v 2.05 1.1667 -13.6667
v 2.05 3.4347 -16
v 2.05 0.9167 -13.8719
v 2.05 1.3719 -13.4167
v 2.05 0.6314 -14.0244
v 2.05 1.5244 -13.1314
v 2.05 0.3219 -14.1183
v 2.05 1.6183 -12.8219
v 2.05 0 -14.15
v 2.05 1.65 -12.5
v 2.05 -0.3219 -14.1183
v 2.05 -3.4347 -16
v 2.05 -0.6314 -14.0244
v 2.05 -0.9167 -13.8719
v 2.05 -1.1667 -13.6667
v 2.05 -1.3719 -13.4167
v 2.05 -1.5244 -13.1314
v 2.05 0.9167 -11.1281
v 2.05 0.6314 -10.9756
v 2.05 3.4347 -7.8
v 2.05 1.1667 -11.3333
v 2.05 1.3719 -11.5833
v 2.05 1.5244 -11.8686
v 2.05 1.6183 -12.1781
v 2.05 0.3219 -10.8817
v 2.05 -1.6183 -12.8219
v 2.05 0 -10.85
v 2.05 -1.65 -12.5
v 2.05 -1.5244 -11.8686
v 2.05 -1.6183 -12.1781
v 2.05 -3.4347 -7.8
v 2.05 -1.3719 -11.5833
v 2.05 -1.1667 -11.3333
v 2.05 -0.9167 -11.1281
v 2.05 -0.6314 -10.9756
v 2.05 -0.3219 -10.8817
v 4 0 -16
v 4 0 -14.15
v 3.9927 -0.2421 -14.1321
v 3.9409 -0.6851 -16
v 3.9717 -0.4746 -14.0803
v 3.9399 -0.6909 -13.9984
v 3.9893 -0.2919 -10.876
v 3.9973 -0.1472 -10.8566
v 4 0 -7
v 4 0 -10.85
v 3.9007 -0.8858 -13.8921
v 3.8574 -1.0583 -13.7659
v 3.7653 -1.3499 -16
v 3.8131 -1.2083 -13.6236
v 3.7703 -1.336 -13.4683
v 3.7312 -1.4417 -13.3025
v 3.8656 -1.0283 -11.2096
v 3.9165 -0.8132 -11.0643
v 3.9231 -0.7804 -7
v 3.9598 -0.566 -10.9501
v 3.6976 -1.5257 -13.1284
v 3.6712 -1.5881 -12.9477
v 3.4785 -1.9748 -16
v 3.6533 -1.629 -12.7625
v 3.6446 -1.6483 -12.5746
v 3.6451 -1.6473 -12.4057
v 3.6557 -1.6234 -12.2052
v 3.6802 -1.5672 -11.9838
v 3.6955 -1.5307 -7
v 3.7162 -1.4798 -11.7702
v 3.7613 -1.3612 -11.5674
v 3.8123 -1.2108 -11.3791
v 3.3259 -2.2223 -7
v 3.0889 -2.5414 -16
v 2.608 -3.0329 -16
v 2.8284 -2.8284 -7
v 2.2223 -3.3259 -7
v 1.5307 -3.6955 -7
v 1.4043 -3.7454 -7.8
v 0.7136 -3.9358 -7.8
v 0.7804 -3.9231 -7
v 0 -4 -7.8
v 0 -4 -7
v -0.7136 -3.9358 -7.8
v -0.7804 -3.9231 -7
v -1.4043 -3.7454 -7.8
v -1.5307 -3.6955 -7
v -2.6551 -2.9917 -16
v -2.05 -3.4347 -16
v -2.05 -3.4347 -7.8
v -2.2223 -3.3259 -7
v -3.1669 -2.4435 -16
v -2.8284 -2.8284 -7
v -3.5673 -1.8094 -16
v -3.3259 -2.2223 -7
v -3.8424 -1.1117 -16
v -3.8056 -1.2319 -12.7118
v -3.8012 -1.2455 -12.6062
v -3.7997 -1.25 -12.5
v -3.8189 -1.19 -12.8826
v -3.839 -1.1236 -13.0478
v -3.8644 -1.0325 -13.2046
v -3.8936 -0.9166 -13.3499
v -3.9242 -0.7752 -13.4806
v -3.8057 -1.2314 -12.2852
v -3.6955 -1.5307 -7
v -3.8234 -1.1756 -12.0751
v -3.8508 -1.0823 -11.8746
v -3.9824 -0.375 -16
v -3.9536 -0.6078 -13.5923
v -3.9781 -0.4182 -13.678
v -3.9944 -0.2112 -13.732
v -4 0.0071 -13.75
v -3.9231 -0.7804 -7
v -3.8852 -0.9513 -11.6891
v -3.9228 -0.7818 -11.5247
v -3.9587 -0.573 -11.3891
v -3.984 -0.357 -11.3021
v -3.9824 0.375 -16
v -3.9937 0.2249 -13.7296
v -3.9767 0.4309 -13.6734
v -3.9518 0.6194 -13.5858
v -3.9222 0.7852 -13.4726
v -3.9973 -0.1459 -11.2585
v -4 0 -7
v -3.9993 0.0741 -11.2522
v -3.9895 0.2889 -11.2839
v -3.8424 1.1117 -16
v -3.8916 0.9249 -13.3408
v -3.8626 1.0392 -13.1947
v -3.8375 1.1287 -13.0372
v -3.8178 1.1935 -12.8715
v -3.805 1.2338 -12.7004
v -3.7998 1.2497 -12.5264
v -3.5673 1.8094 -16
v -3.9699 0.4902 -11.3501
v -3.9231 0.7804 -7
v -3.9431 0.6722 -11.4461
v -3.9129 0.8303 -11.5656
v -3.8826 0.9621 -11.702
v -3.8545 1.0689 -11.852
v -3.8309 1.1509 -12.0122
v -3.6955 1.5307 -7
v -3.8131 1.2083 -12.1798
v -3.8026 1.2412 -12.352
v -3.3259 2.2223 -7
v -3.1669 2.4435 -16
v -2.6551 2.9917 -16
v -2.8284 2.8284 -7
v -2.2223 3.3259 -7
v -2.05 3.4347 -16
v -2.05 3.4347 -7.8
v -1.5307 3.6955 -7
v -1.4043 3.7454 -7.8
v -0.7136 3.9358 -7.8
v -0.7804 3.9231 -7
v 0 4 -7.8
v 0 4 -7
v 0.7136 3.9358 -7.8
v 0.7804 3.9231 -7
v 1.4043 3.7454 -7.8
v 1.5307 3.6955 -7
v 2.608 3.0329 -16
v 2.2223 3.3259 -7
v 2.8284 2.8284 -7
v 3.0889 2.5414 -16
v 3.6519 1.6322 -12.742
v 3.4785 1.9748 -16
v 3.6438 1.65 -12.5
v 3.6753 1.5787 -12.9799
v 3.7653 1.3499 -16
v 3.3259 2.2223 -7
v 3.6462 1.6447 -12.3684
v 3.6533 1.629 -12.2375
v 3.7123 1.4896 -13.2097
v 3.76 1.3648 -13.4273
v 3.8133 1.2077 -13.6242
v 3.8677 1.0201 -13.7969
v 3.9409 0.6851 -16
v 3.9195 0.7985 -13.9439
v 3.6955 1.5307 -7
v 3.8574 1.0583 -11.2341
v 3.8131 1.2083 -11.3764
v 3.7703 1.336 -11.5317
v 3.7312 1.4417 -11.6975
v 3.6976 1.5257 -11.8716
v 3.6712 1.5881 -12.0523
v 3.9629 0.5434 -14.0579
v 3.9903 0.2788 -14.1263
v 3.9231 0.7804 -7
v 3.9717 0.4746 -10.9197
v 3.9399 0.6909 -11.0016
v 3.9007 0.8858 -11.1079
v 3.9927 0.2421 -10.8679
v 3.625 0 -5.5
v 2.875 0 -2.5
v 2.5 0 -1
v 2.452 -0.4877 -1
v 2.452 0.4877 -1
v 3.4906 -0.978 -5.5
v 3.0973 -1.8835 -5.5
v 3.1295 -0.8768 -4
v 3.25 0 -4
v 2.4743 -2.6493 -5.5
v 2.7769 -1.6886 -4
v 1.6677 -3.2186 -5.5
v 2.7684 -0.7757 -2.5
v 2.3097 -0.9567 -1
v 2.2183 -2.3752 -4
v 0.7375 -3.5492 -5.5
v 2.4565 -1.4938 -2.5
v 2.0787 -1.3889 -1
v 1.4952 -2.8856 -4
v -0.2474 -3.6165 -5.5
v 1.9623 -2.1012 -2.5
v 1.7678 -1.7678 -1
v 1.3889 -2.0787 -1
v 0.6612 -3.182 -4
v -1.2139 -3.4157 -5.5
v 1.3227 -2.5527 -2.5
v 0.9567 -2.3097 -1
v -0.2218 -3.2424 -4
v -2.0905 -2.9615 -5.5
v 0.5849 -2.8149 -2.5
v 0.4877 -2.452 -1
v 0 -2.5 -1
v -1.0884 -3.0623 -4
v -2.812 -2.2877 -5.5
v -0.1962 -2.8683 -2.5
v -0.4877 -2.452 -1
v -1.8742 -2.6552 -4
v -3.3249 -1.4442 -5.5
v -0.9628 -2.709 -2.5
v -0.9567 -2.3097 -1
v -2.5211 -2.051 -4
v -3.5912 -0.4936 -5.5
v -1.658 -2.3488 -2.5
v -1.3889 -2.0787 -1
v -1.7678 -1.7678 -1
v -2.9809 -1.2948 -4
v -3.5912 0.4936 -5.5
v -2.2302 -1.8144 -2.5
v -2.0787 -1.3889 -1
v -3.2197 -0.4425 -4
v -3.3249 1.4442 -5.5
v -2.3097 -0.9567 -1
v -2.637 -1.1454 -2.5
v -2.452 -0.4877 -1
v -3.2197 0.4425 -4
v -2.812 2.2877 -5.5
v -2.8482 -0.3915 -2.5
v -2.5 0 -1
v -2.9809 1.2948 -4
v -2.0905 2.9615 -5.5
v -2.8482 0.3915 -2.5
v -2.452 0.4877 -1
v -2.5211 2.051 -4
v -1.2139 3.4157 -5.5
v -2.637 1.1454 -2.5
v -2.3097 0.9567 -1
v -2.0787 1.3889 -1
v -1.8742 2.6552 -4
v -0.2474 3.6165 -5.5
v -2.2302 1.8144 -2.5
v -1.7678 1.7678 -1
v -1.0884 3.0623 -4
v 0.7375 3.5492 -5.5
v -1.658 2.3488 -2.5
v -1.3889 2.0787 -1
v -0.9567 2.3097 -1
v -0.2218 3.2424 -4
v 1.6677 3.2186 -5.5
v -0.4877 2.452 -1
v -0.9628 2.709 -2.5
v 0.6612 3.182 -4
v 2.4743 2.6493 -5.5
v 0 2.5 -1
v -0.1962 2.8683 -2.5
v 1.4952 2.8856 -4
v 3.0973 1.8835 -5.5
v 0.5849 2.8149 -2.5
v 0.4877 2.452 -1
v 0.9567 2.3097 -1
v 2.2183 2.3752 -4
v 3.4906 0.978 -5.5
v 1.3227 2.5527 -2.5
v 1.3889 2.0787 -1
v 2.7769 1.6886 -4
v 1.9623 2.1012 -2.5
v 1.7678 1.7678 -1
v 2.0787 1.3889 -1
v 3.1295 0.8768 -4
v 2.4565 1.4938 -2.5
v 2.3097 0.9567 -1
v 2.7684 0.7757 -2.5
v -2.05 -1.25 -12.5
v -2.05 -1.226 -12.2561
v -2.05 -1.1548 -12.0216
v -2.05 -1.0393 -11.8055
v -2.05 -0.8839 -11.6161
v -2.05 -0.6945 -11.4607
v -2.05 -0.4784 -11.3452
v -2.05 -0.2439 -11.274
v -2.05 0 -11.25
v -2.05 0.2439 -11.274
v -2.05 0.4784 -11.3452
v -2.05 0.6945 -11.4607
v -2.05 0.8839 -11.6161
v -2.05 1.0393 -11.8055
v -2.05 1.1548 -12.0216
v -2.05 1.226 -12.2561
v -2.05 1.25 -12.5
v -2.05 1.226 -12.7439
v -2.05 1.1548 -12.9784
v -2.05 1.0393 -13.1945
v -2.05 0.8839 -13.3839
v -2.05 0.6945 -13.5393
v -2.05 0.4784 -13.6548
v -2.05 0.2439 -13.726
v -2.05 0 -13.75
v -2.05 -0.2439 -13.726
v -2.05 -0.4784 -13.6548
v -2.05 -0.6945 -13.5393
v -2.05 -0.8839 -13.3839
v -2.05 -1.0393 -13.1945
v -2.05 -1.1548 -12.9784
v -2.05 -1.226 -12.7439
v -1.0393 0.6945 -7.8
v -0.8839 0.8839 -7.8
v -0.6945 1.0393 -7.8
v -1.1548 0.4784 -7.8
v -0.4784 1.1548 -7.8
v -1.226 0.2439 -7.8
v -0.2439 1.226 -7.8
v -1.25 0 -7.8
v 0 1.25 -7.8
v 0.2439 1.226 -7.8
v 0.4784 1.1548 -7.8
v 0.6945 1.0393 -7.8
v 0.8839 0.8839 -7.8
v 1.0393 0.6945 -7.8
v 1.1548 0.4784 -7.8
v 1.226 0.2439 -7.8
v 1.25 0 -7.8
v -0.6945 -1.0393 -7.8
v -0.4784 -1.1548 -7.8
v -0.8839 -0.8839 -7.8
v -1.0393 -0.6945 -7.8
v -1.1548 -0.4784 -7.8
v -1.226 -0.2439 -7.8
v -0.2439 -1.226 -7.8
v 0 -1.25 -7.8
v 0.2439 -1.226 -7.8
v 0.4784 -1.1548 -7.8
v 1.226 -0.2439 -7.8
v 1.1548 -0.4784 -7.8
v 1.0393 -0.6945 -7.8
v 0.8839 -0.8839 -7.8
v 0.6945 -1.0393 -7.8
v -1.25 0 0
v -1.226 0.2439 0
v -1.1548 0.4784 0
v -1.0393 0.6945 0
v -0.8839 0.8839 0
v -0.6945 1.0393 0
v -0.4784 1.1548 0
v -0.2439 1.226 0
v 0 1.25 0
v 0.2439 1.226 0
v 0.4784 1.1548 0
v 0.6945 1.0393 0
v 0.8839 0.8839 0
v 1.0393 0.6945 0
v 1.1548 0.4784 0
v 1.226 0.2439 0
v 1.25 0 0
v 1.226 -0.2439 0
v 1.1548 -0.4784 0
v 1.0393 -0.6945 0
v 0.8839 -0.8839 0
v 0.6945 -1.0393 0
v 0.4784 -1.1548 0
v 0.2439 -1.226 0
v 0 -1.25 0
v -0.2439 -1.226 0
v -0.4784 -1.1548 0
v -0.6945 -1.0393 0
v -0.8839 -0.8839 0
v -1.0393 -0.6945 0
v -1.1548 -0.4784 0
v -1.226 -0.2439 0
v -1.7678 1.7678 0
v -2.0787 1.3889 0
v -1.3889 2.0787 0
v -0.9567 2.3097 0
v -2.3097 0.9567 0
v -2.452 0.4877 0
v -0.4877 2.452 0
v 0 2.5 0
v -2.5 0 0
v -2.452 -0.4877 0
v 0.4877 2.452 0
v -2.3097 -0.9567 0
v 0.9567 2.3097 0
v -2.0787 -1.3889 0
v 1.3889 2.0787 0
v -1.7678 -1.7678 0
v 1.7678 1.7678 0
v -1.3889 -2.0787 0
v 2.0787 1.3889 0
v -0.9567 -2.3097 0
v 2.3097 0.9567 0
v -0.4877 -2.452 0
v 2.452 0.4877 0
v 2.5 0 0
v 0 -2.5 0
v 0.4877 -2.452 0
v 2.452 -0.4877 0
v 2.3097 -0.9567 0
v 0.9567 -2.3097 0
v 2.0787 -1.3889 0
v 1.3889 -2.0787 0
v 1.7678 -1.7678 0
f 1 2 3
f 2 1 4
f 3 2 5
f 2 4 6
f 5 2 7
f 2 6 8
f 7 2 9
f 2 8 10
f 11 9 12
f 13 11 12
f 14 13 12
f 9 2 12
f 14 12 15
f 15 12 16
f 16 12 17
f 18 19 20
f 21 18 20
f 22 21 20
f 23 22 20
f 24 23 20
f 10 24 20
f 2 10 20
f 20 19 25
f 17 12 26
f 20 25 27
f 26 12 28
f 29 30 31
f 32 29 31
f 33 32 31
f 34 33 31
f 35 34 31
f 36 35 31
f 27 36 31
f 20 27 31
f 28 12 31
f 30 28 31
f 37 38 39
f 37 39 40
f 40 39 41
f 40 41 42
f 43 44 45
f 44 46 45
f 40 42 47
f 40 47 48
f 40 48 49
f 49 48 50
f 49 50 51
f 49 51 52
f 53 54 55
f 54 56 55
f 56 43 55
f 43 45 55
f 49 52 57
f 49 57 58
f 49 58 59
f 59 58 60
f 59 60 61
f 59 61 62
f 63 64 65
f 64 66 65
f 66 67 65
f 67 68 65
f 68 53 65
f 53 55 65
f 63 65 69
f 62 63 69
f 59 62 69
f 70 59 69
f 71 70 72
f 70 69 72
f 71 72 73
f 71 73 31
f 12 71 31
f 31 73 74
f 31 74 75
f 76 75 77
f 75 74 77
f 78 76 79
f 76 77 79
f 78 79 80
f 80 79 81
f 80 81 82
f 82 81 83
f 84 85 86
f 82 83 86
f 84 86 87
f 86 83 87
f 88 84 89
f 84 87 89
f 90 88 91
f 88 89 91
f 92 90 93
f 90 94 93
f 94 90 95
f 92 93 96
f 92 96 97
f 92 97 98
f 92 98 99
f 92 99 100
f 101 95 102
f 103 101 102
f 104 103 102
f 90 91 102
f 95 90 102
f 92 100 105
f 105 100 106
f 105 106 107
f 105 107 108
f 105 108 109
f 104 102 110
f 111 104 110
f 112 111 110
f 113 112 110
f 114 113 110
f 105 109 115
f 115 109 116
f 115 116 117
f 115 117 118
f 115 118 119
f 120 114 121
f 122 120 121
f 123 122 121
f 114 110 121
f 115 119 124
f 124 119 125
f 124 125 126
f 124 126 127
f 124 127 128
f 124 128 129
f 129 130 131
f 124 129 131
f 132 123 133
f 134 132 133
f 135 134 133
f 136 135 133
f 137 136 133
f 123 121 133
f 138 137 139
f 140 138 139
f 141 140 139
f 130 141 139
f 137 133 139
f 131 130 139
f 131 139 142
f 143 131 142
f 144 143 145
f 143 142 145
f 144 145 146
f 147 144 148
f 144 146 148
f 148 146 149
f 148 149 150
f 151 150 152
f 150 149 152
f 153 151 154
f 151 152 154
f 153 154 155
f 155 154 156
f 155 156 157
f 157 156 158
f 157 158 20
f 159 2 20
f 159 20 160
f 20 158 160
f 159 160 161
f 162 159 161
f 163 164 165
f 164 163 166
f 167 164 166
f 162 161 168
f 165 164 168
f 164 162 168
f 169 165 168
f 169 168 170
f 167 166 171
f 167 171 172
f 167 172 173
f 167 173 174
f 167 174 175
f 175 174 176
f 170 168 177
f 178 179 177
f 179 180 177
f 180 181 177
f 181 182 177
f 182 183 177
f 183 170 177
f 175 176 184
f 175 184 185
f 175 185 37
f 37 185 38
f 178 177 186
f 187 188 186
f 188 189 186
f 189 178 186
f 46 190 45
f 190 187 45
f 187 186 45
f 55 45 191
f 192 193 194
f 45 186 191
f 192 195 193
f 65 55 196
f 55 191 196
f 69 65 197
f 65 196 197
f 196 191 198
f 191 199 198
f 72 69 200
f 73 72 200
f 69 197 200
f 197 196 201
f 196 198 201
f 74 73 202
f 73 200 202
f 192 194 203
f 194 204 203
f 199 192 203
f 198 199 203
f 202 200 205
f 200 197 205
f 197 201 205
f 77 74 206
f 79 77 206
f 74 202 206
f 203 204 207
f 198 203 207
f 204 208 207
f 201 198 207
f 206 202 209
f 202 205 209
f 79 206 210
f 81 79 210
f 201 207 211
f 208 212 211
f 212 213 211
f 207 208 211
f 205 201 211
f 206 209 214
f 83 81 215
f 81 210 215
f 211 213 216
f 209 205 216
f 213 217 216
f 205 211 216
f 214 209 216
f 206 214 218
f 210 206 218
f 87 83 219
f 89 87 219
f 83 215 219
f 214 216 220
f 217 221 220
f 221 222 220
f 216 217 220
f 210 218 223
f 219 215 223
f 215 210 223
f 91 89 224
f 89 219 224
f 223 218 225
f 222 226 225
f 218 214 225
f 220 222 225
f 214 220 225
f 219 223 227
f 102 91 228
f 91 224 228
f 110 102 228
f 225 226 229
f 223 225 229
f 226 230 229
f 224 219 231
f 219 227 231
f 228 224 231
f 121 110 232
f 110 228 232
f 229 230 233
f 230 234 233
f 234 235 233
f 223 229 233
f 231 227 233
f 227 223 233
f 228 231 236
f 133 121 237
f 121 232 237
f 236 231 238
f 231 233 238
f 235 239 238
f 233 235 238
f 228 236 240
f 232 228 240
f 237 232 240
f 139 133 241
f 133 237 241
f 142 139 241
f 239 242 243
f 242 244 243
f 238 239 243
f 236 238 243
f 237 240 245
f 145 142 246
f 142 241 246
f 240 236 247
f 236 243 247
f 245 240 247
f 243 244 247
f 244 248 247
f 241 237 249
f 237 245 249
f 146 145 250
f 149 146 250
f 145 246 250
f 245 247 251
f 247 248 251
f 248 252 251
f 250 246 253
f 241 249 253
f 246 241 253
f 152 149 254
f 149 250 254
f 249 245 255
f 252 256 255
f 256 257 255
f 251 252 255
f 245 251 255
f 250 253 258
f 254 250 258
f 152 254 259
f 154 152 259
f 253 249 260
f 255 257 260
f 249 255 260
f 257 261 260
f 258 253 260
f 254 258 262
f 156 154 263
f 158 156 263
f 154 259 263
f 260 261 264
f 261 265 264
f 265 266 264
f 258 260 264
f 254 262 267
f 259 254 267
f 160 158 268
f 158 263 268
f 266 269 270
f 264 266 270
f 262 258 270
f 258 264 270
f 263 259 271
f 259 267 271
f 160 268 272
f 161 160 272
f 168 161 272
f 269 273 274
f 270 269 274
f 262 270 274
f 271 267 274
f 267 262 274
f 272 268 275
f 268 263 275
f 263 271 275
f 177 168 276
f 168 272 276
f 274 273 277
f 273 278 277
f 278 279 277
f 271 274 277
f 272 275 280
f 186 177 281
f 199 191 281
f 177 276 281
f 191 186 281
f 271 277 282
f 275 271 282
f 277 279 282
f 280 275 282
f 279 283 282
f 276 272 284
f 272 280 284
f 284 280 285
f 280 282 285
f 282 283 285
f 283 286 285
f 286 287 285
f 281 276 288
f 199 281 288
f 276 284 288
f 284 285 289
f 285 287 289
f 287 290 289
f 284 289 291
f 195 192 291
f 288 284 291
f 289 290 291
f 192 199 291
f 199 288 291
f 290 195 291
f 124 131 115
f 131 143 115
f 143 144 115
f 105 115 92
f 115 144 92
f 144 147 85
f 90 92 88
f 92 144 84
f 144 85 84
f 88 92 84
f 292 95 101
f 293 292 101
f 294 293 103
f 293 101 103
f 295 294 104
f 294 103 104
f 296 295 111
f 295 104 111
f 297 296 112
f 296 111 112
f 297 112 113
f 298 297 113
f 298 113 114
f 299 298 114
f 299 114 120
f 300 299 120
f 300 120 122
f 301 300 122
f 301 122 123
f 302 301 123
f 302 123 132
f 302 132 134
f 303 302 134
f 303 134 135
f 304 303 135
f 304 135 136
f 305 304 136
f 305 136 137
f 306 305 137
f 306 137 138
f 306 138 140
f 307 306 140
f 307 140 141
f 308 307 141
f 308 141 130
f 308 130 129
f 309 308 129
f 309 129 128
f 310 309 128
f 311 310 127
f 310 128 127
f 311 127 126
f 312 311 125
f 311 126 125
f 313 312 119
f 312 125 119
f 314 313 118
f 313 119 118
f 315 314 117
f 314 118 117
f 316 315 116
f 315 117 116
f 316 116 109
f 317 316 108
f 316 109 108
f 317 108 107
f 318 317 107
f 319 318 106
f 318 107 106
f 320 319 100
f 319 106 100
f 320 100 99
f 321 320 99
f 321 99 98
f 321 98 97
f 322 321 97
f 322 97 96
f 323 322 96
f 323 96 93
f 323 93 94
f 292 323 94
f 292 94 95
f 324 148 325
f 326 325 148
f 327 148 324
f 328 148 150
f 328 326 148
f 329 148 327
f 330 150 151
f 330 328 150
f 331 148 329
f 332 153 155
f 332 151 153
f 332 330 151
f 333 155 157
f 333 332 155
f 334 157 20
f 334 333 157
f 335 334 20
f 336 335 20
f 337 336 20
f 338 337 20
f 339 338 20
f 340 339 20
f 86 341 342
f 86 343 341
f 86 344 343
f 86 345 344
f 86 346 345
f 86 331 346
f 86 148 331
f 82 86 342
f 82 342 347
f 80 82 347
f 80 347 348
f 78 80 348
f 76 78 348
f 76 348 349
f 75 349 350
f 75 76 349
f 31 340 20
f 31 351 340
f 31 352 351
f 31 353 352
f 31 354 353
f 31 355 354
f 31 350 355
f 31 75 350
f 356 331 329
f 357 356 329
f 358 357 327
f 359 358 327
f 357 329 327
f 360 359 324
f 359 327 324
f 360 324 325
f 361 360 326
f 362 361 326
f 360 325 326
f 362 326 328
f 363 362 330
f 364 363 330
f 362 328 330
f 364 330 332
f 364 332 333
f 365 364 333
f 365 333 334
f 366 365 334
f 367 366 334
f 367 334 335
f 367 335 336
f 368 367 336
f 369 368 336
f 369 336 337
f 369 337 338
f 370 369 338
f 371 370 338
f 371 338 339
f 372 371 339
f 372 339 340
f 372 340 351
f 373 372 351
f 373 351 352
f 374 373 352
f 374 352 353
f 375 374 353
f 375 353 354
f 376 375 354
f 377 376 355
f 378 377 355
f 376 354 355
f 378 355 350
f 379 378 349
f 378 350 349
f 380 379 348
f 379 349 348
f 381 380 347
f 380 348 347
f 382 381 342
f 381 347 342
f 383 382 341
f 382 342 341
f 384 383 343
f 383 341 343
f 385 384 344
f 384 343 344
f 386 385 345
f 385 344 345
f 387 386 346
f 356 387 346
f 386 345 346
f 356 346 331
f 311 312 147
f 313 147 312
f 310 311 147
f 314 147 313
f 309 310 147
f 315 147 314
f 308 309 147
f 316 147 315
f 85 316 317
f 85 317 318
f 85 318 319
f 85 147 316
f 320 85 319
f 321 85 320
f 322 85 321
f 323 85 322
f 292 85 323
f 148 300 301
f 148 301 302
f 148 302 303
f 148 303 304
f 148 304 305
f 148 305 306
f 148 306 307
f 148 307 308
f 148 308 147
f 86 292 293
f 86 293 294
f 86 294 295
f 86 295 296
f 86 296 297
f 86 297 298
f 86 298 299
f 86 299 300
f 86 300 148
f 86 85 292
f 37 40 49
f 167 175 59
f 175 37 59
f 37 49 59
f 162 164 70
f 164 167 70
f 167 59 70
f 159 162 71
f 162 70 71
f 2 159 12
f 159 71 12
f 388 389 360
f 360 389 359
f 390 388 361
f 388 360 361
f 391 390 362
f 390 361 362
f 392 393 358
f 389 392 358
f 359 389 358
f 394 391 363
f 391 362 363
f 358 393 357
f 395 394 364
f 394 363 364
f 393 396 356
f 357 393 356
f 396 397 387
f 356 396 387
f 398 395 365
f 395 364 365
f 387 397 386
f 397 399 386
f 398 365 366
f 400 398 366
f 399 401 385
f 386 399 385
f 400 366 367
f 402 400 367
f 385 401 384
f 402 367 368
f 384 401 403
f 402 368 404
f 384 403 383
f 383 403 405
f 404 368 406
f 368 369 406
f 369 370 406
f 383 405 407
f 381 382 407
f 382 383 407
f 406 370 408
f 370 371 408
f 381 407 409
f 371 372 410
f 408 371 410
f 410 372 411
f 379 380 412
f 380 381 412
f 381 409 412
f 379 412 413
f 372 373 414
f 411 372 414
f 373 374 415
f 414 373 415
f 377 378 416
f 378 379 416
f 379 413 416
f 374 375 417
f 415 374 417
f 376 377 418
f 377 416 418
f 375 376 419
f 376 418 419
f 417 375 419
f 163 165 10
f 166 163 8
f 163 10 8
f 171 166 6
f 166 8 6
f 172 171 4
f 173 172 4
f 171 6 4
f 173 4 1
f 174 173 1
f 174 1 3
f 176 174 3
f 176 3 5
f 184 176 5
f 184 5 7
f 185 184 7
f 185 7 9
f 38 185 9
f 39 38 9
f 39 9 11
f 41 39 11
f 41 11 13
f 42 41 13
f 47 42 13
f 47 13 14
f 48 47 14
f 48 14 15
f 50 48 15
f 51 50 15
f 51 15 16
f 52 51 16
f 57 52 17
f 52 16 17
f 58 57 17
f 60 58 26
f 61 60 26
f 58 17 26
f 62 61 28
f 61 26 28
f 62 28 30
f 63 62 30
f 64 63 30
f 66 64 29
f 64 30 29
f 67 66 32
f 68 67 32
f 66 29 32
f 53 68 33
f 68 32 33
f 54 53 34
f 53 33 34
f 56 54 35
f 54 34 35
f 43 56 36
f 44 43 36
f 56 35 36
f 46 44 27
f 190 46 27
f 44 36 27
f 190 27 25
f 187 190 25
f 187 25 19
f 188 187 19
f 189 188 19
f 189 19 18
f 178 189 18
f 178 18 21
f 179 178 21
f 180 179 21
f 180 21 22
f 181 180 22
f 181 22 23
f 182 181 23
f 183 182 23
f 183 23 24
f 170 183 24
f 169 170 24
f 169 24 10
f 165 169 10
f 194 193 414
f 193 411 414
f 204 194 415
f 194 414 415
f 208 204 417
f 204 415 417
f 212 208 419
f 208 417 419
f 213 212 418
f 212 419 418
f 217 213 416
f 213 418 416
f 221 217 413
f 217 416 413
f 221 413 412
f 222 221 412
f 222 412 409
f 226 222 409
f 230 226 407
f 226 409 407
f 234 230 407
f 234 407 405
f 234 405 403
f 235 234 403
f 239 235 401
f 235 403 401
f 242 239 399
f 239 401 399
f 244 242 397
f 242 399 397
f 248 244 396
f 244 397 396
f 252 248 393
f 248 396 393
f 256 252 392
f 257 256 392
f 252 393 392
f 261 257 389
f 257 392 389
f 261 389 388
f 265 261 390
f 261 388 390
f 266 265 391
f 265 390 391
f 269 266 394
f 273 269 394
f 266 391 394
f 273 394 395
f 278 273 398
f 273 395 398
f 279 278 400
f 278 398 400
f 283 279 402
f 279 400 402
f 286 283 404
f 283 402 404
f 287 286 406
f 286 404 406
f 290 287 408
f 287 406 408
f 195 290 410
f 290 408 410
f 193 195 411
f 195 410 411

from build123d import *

# Parameters (mm, degrees)
F2_W          = 4.1
F2_H          = 8.2
F3_DEPTH      = 4.001
F3_DEPTH_BACK = 4.001
F5_D          = 3.3
F5_DEPTH      = 4.001
F6_D          = 2.5
F8_D          = 2.5


with BuildPart() as f1:
    # F0 (on Front) → F1 (revolve)
    with BuildSketch(Plane.XZ):
        Polygon((2.5, 0), (0, 0), (0, -16), (4, -16), (4, -7), (2.5, -1), align=None)
    revolve(axis=Axis((0, 0, -12.0333206053), (0, 0, -1)))

    # F2 (on Front) → F3 (cut, two sides)
    with BuildSketch(Plane.XZ) as f3_sk:
        with Locations((0, -11.9)):
            Rectangle(F2_W, F2_H)
    extrude(amount=F3_DEPTH, mode=Mode.SUBTRACT)
    extrude(f3_sk.sketch, amount=-F3_DEPTH_BACK, mode=Mode.SUBTRACT)

    # F5 (through all, one way)
    with BuildSketch(Plane(origin=(0, 0, 0), x_dir=(0, 1, 0), z_dir=(-1, 0, 0))):
        with Locations((0, 12.5)):
            Circle(F5_D / 2)
    extrude(amount=-F5_DEPTH, mode=Mode.SUBTRACT)

    # F6 (through all)
    with Locations(Plane.YZ):
        with Locations((0, -12.5)):
            Hole(F6_D / 2)

    # F8 (through all)
    with Locations(Plane.XY):
        with Locations((0, 0)):
            Hole(F8_D / 2)


solid = f1.part
